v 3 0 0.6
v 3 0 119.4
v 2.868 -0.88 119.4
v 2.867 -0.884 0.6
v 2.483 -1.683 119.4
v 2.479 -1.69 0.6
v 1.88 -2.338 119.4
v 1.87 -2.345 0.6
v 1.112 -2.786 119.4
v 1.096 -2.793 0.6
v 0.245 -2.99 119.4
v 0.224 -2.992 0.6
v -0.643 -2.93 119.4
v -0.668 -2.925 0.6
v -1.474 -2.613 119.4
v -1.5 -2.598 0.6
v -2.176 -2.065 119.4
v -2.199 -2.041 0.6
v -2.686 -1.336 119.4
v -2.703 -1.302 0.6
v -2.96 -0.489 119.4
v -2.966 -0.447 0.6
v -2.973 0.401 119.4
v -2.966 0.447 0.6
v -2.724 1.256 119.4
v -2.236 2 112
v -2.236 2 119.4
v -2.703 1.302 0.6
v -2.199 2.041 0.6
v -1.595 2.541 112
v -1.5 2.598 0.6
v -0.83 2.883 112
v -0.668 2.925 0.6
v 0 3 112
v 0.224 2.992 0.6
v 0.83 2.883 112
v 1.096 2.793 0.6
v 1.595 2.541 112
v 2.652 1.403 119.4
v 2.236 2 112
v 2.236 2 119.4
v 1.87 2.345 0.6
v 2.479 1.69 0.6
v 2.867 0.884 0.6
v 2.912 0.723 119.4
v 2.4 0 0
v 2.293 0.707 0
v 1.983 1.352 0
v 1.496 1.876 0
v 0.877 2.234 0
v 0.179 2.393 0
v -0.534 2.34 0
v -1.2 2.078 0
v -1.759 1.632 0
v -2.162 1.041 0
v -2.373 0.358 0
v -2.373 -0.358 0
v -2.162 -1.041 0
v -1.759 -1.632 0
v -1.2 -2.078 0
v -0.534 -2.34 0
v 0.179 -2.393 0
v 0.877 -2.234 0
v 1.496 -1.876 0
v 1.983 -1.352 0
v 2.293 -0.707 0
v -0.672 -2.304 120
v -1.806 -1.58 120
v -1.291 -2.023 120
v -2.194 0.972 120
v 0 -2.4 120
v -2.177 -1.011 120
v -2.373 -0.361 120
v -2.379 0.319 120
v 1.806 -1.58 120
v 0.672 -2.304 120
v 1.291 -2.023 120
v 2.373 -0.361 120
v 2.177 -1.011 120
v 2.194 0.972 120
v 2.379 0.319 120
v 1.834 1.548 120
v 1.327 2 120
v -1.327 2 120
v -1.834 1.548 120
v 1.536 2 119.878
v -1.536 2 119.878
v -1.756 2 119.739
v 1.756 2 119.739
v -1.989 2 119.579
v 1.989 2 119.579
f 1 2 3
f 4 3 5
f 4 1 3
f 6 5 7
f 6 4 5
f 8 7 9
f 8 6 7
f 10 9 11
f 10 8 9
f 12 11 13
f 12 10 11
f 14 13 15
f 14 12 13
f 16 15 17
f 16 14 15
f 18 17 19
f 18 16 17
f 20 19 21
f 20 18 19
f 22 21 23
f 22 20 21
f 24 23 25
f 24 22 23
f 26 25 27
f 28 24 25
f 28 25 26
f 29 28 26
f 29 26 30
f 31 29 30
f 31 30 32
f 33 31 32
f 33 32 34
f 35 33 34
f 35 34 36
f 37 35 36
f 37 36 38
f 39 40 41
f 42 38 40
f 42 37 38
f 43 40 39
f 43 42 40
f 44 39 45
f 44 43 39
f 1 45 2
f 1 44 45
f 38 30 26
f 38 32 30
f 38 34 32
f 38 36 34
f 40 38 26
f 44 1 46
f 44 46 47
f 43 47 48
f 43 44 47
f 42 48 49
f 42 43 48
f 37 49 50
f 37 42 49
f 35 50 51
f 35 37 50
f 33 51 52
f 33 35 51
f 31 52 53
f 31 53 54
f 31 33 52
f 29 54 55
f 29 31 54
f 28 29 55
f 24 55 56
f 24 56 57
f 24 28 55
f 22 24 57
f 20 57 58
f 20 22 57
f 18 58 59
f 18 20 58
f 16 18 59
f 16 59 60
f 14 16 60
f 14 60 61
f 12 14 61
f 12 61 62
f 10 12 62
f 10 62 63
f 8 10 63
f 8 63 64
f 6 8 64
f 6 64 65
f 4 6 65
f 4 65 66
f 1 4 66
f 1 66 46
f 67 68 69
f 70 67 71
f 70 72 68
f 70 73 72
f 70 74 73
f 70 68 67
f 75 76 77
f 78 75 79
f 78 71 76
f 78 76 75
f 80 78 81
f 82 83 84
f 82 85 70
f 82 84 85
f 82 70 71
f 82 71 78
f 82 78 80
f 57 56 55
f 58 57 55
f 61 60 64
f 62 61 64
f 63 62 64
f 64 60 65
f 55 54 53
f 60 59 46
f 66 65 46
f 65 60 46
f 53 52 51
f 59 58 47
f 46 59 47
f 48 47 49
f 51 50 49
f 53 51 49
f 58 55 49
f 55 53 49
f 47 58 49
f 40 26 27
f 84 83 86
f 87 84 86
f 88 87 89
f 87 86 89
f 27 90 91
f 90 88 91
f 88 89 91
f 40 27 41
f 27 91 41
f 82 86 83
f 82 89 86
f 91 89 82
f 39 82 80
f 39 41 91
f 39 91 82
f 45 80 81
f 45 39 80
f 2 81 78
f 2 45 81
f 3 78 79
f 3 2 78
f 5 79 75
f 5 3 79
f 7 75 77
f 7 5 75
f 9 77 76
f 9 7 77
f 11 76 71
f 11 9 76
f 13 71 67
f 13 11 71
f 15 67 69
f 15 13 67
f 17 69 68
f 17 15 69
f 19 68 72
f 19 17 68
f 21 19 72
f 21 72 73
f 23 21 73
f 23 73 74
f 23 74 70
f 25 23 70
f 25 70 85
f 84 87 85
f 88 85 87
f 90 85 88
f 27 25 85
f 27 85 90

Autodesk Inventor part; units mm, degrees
ref_plane "YZ Plane" through (0, 0, 0) normal (1, 0, 0) x (0, 1, 0)
ref_plane "XZ Plane" through (0, 0, 0) normal (0, 1, 0) x (-1, 0, 0)
ref_plane "XY Plane" through (0, 0, 0) normal (0, 0, 1) x (1, 0, 0)
sketch "Sketch1" plane through (0, 0, 0) normal (0, 0, 1) x (1, 0, 0)
  circle A0 centre (0, 0) radius 3
  dimension "d0" = 6
extrude "Extrusion1" add sketch "Sketch1" along normal blind 120
thread "Thread1" size "M6x0.5" class "6g" standard "ISO Metric profile" full length
chamfer "Chamfer1" distance 0.6 angle 45 1 edges at (-3, 0, 120)
chamfer "Chamfer2" distance 0.6 angle 45 1 edges at (-3, 0, 0)
sketch "Sketch2" plane through (0, 0, 120) normal (0, 0, 1) x (1, 0, 0)
  line L0 (3.8696, 4.6025) -> (-3.8038, 4.6025)
  line L1 (-3.8038, 4.6025) -> (-3.8038, 2)
  line L2 (-3.8038, 2) -> (3.8696, 2)
  line L3 (3.8696, 2) -> (3.8696, 4.6025)
  point P0 (0, 0)
  dimension "d11" = 2
extrude "Extrusion2" cut sketch "Sketch2" against normal blind 8
properties part number "popychacz"
